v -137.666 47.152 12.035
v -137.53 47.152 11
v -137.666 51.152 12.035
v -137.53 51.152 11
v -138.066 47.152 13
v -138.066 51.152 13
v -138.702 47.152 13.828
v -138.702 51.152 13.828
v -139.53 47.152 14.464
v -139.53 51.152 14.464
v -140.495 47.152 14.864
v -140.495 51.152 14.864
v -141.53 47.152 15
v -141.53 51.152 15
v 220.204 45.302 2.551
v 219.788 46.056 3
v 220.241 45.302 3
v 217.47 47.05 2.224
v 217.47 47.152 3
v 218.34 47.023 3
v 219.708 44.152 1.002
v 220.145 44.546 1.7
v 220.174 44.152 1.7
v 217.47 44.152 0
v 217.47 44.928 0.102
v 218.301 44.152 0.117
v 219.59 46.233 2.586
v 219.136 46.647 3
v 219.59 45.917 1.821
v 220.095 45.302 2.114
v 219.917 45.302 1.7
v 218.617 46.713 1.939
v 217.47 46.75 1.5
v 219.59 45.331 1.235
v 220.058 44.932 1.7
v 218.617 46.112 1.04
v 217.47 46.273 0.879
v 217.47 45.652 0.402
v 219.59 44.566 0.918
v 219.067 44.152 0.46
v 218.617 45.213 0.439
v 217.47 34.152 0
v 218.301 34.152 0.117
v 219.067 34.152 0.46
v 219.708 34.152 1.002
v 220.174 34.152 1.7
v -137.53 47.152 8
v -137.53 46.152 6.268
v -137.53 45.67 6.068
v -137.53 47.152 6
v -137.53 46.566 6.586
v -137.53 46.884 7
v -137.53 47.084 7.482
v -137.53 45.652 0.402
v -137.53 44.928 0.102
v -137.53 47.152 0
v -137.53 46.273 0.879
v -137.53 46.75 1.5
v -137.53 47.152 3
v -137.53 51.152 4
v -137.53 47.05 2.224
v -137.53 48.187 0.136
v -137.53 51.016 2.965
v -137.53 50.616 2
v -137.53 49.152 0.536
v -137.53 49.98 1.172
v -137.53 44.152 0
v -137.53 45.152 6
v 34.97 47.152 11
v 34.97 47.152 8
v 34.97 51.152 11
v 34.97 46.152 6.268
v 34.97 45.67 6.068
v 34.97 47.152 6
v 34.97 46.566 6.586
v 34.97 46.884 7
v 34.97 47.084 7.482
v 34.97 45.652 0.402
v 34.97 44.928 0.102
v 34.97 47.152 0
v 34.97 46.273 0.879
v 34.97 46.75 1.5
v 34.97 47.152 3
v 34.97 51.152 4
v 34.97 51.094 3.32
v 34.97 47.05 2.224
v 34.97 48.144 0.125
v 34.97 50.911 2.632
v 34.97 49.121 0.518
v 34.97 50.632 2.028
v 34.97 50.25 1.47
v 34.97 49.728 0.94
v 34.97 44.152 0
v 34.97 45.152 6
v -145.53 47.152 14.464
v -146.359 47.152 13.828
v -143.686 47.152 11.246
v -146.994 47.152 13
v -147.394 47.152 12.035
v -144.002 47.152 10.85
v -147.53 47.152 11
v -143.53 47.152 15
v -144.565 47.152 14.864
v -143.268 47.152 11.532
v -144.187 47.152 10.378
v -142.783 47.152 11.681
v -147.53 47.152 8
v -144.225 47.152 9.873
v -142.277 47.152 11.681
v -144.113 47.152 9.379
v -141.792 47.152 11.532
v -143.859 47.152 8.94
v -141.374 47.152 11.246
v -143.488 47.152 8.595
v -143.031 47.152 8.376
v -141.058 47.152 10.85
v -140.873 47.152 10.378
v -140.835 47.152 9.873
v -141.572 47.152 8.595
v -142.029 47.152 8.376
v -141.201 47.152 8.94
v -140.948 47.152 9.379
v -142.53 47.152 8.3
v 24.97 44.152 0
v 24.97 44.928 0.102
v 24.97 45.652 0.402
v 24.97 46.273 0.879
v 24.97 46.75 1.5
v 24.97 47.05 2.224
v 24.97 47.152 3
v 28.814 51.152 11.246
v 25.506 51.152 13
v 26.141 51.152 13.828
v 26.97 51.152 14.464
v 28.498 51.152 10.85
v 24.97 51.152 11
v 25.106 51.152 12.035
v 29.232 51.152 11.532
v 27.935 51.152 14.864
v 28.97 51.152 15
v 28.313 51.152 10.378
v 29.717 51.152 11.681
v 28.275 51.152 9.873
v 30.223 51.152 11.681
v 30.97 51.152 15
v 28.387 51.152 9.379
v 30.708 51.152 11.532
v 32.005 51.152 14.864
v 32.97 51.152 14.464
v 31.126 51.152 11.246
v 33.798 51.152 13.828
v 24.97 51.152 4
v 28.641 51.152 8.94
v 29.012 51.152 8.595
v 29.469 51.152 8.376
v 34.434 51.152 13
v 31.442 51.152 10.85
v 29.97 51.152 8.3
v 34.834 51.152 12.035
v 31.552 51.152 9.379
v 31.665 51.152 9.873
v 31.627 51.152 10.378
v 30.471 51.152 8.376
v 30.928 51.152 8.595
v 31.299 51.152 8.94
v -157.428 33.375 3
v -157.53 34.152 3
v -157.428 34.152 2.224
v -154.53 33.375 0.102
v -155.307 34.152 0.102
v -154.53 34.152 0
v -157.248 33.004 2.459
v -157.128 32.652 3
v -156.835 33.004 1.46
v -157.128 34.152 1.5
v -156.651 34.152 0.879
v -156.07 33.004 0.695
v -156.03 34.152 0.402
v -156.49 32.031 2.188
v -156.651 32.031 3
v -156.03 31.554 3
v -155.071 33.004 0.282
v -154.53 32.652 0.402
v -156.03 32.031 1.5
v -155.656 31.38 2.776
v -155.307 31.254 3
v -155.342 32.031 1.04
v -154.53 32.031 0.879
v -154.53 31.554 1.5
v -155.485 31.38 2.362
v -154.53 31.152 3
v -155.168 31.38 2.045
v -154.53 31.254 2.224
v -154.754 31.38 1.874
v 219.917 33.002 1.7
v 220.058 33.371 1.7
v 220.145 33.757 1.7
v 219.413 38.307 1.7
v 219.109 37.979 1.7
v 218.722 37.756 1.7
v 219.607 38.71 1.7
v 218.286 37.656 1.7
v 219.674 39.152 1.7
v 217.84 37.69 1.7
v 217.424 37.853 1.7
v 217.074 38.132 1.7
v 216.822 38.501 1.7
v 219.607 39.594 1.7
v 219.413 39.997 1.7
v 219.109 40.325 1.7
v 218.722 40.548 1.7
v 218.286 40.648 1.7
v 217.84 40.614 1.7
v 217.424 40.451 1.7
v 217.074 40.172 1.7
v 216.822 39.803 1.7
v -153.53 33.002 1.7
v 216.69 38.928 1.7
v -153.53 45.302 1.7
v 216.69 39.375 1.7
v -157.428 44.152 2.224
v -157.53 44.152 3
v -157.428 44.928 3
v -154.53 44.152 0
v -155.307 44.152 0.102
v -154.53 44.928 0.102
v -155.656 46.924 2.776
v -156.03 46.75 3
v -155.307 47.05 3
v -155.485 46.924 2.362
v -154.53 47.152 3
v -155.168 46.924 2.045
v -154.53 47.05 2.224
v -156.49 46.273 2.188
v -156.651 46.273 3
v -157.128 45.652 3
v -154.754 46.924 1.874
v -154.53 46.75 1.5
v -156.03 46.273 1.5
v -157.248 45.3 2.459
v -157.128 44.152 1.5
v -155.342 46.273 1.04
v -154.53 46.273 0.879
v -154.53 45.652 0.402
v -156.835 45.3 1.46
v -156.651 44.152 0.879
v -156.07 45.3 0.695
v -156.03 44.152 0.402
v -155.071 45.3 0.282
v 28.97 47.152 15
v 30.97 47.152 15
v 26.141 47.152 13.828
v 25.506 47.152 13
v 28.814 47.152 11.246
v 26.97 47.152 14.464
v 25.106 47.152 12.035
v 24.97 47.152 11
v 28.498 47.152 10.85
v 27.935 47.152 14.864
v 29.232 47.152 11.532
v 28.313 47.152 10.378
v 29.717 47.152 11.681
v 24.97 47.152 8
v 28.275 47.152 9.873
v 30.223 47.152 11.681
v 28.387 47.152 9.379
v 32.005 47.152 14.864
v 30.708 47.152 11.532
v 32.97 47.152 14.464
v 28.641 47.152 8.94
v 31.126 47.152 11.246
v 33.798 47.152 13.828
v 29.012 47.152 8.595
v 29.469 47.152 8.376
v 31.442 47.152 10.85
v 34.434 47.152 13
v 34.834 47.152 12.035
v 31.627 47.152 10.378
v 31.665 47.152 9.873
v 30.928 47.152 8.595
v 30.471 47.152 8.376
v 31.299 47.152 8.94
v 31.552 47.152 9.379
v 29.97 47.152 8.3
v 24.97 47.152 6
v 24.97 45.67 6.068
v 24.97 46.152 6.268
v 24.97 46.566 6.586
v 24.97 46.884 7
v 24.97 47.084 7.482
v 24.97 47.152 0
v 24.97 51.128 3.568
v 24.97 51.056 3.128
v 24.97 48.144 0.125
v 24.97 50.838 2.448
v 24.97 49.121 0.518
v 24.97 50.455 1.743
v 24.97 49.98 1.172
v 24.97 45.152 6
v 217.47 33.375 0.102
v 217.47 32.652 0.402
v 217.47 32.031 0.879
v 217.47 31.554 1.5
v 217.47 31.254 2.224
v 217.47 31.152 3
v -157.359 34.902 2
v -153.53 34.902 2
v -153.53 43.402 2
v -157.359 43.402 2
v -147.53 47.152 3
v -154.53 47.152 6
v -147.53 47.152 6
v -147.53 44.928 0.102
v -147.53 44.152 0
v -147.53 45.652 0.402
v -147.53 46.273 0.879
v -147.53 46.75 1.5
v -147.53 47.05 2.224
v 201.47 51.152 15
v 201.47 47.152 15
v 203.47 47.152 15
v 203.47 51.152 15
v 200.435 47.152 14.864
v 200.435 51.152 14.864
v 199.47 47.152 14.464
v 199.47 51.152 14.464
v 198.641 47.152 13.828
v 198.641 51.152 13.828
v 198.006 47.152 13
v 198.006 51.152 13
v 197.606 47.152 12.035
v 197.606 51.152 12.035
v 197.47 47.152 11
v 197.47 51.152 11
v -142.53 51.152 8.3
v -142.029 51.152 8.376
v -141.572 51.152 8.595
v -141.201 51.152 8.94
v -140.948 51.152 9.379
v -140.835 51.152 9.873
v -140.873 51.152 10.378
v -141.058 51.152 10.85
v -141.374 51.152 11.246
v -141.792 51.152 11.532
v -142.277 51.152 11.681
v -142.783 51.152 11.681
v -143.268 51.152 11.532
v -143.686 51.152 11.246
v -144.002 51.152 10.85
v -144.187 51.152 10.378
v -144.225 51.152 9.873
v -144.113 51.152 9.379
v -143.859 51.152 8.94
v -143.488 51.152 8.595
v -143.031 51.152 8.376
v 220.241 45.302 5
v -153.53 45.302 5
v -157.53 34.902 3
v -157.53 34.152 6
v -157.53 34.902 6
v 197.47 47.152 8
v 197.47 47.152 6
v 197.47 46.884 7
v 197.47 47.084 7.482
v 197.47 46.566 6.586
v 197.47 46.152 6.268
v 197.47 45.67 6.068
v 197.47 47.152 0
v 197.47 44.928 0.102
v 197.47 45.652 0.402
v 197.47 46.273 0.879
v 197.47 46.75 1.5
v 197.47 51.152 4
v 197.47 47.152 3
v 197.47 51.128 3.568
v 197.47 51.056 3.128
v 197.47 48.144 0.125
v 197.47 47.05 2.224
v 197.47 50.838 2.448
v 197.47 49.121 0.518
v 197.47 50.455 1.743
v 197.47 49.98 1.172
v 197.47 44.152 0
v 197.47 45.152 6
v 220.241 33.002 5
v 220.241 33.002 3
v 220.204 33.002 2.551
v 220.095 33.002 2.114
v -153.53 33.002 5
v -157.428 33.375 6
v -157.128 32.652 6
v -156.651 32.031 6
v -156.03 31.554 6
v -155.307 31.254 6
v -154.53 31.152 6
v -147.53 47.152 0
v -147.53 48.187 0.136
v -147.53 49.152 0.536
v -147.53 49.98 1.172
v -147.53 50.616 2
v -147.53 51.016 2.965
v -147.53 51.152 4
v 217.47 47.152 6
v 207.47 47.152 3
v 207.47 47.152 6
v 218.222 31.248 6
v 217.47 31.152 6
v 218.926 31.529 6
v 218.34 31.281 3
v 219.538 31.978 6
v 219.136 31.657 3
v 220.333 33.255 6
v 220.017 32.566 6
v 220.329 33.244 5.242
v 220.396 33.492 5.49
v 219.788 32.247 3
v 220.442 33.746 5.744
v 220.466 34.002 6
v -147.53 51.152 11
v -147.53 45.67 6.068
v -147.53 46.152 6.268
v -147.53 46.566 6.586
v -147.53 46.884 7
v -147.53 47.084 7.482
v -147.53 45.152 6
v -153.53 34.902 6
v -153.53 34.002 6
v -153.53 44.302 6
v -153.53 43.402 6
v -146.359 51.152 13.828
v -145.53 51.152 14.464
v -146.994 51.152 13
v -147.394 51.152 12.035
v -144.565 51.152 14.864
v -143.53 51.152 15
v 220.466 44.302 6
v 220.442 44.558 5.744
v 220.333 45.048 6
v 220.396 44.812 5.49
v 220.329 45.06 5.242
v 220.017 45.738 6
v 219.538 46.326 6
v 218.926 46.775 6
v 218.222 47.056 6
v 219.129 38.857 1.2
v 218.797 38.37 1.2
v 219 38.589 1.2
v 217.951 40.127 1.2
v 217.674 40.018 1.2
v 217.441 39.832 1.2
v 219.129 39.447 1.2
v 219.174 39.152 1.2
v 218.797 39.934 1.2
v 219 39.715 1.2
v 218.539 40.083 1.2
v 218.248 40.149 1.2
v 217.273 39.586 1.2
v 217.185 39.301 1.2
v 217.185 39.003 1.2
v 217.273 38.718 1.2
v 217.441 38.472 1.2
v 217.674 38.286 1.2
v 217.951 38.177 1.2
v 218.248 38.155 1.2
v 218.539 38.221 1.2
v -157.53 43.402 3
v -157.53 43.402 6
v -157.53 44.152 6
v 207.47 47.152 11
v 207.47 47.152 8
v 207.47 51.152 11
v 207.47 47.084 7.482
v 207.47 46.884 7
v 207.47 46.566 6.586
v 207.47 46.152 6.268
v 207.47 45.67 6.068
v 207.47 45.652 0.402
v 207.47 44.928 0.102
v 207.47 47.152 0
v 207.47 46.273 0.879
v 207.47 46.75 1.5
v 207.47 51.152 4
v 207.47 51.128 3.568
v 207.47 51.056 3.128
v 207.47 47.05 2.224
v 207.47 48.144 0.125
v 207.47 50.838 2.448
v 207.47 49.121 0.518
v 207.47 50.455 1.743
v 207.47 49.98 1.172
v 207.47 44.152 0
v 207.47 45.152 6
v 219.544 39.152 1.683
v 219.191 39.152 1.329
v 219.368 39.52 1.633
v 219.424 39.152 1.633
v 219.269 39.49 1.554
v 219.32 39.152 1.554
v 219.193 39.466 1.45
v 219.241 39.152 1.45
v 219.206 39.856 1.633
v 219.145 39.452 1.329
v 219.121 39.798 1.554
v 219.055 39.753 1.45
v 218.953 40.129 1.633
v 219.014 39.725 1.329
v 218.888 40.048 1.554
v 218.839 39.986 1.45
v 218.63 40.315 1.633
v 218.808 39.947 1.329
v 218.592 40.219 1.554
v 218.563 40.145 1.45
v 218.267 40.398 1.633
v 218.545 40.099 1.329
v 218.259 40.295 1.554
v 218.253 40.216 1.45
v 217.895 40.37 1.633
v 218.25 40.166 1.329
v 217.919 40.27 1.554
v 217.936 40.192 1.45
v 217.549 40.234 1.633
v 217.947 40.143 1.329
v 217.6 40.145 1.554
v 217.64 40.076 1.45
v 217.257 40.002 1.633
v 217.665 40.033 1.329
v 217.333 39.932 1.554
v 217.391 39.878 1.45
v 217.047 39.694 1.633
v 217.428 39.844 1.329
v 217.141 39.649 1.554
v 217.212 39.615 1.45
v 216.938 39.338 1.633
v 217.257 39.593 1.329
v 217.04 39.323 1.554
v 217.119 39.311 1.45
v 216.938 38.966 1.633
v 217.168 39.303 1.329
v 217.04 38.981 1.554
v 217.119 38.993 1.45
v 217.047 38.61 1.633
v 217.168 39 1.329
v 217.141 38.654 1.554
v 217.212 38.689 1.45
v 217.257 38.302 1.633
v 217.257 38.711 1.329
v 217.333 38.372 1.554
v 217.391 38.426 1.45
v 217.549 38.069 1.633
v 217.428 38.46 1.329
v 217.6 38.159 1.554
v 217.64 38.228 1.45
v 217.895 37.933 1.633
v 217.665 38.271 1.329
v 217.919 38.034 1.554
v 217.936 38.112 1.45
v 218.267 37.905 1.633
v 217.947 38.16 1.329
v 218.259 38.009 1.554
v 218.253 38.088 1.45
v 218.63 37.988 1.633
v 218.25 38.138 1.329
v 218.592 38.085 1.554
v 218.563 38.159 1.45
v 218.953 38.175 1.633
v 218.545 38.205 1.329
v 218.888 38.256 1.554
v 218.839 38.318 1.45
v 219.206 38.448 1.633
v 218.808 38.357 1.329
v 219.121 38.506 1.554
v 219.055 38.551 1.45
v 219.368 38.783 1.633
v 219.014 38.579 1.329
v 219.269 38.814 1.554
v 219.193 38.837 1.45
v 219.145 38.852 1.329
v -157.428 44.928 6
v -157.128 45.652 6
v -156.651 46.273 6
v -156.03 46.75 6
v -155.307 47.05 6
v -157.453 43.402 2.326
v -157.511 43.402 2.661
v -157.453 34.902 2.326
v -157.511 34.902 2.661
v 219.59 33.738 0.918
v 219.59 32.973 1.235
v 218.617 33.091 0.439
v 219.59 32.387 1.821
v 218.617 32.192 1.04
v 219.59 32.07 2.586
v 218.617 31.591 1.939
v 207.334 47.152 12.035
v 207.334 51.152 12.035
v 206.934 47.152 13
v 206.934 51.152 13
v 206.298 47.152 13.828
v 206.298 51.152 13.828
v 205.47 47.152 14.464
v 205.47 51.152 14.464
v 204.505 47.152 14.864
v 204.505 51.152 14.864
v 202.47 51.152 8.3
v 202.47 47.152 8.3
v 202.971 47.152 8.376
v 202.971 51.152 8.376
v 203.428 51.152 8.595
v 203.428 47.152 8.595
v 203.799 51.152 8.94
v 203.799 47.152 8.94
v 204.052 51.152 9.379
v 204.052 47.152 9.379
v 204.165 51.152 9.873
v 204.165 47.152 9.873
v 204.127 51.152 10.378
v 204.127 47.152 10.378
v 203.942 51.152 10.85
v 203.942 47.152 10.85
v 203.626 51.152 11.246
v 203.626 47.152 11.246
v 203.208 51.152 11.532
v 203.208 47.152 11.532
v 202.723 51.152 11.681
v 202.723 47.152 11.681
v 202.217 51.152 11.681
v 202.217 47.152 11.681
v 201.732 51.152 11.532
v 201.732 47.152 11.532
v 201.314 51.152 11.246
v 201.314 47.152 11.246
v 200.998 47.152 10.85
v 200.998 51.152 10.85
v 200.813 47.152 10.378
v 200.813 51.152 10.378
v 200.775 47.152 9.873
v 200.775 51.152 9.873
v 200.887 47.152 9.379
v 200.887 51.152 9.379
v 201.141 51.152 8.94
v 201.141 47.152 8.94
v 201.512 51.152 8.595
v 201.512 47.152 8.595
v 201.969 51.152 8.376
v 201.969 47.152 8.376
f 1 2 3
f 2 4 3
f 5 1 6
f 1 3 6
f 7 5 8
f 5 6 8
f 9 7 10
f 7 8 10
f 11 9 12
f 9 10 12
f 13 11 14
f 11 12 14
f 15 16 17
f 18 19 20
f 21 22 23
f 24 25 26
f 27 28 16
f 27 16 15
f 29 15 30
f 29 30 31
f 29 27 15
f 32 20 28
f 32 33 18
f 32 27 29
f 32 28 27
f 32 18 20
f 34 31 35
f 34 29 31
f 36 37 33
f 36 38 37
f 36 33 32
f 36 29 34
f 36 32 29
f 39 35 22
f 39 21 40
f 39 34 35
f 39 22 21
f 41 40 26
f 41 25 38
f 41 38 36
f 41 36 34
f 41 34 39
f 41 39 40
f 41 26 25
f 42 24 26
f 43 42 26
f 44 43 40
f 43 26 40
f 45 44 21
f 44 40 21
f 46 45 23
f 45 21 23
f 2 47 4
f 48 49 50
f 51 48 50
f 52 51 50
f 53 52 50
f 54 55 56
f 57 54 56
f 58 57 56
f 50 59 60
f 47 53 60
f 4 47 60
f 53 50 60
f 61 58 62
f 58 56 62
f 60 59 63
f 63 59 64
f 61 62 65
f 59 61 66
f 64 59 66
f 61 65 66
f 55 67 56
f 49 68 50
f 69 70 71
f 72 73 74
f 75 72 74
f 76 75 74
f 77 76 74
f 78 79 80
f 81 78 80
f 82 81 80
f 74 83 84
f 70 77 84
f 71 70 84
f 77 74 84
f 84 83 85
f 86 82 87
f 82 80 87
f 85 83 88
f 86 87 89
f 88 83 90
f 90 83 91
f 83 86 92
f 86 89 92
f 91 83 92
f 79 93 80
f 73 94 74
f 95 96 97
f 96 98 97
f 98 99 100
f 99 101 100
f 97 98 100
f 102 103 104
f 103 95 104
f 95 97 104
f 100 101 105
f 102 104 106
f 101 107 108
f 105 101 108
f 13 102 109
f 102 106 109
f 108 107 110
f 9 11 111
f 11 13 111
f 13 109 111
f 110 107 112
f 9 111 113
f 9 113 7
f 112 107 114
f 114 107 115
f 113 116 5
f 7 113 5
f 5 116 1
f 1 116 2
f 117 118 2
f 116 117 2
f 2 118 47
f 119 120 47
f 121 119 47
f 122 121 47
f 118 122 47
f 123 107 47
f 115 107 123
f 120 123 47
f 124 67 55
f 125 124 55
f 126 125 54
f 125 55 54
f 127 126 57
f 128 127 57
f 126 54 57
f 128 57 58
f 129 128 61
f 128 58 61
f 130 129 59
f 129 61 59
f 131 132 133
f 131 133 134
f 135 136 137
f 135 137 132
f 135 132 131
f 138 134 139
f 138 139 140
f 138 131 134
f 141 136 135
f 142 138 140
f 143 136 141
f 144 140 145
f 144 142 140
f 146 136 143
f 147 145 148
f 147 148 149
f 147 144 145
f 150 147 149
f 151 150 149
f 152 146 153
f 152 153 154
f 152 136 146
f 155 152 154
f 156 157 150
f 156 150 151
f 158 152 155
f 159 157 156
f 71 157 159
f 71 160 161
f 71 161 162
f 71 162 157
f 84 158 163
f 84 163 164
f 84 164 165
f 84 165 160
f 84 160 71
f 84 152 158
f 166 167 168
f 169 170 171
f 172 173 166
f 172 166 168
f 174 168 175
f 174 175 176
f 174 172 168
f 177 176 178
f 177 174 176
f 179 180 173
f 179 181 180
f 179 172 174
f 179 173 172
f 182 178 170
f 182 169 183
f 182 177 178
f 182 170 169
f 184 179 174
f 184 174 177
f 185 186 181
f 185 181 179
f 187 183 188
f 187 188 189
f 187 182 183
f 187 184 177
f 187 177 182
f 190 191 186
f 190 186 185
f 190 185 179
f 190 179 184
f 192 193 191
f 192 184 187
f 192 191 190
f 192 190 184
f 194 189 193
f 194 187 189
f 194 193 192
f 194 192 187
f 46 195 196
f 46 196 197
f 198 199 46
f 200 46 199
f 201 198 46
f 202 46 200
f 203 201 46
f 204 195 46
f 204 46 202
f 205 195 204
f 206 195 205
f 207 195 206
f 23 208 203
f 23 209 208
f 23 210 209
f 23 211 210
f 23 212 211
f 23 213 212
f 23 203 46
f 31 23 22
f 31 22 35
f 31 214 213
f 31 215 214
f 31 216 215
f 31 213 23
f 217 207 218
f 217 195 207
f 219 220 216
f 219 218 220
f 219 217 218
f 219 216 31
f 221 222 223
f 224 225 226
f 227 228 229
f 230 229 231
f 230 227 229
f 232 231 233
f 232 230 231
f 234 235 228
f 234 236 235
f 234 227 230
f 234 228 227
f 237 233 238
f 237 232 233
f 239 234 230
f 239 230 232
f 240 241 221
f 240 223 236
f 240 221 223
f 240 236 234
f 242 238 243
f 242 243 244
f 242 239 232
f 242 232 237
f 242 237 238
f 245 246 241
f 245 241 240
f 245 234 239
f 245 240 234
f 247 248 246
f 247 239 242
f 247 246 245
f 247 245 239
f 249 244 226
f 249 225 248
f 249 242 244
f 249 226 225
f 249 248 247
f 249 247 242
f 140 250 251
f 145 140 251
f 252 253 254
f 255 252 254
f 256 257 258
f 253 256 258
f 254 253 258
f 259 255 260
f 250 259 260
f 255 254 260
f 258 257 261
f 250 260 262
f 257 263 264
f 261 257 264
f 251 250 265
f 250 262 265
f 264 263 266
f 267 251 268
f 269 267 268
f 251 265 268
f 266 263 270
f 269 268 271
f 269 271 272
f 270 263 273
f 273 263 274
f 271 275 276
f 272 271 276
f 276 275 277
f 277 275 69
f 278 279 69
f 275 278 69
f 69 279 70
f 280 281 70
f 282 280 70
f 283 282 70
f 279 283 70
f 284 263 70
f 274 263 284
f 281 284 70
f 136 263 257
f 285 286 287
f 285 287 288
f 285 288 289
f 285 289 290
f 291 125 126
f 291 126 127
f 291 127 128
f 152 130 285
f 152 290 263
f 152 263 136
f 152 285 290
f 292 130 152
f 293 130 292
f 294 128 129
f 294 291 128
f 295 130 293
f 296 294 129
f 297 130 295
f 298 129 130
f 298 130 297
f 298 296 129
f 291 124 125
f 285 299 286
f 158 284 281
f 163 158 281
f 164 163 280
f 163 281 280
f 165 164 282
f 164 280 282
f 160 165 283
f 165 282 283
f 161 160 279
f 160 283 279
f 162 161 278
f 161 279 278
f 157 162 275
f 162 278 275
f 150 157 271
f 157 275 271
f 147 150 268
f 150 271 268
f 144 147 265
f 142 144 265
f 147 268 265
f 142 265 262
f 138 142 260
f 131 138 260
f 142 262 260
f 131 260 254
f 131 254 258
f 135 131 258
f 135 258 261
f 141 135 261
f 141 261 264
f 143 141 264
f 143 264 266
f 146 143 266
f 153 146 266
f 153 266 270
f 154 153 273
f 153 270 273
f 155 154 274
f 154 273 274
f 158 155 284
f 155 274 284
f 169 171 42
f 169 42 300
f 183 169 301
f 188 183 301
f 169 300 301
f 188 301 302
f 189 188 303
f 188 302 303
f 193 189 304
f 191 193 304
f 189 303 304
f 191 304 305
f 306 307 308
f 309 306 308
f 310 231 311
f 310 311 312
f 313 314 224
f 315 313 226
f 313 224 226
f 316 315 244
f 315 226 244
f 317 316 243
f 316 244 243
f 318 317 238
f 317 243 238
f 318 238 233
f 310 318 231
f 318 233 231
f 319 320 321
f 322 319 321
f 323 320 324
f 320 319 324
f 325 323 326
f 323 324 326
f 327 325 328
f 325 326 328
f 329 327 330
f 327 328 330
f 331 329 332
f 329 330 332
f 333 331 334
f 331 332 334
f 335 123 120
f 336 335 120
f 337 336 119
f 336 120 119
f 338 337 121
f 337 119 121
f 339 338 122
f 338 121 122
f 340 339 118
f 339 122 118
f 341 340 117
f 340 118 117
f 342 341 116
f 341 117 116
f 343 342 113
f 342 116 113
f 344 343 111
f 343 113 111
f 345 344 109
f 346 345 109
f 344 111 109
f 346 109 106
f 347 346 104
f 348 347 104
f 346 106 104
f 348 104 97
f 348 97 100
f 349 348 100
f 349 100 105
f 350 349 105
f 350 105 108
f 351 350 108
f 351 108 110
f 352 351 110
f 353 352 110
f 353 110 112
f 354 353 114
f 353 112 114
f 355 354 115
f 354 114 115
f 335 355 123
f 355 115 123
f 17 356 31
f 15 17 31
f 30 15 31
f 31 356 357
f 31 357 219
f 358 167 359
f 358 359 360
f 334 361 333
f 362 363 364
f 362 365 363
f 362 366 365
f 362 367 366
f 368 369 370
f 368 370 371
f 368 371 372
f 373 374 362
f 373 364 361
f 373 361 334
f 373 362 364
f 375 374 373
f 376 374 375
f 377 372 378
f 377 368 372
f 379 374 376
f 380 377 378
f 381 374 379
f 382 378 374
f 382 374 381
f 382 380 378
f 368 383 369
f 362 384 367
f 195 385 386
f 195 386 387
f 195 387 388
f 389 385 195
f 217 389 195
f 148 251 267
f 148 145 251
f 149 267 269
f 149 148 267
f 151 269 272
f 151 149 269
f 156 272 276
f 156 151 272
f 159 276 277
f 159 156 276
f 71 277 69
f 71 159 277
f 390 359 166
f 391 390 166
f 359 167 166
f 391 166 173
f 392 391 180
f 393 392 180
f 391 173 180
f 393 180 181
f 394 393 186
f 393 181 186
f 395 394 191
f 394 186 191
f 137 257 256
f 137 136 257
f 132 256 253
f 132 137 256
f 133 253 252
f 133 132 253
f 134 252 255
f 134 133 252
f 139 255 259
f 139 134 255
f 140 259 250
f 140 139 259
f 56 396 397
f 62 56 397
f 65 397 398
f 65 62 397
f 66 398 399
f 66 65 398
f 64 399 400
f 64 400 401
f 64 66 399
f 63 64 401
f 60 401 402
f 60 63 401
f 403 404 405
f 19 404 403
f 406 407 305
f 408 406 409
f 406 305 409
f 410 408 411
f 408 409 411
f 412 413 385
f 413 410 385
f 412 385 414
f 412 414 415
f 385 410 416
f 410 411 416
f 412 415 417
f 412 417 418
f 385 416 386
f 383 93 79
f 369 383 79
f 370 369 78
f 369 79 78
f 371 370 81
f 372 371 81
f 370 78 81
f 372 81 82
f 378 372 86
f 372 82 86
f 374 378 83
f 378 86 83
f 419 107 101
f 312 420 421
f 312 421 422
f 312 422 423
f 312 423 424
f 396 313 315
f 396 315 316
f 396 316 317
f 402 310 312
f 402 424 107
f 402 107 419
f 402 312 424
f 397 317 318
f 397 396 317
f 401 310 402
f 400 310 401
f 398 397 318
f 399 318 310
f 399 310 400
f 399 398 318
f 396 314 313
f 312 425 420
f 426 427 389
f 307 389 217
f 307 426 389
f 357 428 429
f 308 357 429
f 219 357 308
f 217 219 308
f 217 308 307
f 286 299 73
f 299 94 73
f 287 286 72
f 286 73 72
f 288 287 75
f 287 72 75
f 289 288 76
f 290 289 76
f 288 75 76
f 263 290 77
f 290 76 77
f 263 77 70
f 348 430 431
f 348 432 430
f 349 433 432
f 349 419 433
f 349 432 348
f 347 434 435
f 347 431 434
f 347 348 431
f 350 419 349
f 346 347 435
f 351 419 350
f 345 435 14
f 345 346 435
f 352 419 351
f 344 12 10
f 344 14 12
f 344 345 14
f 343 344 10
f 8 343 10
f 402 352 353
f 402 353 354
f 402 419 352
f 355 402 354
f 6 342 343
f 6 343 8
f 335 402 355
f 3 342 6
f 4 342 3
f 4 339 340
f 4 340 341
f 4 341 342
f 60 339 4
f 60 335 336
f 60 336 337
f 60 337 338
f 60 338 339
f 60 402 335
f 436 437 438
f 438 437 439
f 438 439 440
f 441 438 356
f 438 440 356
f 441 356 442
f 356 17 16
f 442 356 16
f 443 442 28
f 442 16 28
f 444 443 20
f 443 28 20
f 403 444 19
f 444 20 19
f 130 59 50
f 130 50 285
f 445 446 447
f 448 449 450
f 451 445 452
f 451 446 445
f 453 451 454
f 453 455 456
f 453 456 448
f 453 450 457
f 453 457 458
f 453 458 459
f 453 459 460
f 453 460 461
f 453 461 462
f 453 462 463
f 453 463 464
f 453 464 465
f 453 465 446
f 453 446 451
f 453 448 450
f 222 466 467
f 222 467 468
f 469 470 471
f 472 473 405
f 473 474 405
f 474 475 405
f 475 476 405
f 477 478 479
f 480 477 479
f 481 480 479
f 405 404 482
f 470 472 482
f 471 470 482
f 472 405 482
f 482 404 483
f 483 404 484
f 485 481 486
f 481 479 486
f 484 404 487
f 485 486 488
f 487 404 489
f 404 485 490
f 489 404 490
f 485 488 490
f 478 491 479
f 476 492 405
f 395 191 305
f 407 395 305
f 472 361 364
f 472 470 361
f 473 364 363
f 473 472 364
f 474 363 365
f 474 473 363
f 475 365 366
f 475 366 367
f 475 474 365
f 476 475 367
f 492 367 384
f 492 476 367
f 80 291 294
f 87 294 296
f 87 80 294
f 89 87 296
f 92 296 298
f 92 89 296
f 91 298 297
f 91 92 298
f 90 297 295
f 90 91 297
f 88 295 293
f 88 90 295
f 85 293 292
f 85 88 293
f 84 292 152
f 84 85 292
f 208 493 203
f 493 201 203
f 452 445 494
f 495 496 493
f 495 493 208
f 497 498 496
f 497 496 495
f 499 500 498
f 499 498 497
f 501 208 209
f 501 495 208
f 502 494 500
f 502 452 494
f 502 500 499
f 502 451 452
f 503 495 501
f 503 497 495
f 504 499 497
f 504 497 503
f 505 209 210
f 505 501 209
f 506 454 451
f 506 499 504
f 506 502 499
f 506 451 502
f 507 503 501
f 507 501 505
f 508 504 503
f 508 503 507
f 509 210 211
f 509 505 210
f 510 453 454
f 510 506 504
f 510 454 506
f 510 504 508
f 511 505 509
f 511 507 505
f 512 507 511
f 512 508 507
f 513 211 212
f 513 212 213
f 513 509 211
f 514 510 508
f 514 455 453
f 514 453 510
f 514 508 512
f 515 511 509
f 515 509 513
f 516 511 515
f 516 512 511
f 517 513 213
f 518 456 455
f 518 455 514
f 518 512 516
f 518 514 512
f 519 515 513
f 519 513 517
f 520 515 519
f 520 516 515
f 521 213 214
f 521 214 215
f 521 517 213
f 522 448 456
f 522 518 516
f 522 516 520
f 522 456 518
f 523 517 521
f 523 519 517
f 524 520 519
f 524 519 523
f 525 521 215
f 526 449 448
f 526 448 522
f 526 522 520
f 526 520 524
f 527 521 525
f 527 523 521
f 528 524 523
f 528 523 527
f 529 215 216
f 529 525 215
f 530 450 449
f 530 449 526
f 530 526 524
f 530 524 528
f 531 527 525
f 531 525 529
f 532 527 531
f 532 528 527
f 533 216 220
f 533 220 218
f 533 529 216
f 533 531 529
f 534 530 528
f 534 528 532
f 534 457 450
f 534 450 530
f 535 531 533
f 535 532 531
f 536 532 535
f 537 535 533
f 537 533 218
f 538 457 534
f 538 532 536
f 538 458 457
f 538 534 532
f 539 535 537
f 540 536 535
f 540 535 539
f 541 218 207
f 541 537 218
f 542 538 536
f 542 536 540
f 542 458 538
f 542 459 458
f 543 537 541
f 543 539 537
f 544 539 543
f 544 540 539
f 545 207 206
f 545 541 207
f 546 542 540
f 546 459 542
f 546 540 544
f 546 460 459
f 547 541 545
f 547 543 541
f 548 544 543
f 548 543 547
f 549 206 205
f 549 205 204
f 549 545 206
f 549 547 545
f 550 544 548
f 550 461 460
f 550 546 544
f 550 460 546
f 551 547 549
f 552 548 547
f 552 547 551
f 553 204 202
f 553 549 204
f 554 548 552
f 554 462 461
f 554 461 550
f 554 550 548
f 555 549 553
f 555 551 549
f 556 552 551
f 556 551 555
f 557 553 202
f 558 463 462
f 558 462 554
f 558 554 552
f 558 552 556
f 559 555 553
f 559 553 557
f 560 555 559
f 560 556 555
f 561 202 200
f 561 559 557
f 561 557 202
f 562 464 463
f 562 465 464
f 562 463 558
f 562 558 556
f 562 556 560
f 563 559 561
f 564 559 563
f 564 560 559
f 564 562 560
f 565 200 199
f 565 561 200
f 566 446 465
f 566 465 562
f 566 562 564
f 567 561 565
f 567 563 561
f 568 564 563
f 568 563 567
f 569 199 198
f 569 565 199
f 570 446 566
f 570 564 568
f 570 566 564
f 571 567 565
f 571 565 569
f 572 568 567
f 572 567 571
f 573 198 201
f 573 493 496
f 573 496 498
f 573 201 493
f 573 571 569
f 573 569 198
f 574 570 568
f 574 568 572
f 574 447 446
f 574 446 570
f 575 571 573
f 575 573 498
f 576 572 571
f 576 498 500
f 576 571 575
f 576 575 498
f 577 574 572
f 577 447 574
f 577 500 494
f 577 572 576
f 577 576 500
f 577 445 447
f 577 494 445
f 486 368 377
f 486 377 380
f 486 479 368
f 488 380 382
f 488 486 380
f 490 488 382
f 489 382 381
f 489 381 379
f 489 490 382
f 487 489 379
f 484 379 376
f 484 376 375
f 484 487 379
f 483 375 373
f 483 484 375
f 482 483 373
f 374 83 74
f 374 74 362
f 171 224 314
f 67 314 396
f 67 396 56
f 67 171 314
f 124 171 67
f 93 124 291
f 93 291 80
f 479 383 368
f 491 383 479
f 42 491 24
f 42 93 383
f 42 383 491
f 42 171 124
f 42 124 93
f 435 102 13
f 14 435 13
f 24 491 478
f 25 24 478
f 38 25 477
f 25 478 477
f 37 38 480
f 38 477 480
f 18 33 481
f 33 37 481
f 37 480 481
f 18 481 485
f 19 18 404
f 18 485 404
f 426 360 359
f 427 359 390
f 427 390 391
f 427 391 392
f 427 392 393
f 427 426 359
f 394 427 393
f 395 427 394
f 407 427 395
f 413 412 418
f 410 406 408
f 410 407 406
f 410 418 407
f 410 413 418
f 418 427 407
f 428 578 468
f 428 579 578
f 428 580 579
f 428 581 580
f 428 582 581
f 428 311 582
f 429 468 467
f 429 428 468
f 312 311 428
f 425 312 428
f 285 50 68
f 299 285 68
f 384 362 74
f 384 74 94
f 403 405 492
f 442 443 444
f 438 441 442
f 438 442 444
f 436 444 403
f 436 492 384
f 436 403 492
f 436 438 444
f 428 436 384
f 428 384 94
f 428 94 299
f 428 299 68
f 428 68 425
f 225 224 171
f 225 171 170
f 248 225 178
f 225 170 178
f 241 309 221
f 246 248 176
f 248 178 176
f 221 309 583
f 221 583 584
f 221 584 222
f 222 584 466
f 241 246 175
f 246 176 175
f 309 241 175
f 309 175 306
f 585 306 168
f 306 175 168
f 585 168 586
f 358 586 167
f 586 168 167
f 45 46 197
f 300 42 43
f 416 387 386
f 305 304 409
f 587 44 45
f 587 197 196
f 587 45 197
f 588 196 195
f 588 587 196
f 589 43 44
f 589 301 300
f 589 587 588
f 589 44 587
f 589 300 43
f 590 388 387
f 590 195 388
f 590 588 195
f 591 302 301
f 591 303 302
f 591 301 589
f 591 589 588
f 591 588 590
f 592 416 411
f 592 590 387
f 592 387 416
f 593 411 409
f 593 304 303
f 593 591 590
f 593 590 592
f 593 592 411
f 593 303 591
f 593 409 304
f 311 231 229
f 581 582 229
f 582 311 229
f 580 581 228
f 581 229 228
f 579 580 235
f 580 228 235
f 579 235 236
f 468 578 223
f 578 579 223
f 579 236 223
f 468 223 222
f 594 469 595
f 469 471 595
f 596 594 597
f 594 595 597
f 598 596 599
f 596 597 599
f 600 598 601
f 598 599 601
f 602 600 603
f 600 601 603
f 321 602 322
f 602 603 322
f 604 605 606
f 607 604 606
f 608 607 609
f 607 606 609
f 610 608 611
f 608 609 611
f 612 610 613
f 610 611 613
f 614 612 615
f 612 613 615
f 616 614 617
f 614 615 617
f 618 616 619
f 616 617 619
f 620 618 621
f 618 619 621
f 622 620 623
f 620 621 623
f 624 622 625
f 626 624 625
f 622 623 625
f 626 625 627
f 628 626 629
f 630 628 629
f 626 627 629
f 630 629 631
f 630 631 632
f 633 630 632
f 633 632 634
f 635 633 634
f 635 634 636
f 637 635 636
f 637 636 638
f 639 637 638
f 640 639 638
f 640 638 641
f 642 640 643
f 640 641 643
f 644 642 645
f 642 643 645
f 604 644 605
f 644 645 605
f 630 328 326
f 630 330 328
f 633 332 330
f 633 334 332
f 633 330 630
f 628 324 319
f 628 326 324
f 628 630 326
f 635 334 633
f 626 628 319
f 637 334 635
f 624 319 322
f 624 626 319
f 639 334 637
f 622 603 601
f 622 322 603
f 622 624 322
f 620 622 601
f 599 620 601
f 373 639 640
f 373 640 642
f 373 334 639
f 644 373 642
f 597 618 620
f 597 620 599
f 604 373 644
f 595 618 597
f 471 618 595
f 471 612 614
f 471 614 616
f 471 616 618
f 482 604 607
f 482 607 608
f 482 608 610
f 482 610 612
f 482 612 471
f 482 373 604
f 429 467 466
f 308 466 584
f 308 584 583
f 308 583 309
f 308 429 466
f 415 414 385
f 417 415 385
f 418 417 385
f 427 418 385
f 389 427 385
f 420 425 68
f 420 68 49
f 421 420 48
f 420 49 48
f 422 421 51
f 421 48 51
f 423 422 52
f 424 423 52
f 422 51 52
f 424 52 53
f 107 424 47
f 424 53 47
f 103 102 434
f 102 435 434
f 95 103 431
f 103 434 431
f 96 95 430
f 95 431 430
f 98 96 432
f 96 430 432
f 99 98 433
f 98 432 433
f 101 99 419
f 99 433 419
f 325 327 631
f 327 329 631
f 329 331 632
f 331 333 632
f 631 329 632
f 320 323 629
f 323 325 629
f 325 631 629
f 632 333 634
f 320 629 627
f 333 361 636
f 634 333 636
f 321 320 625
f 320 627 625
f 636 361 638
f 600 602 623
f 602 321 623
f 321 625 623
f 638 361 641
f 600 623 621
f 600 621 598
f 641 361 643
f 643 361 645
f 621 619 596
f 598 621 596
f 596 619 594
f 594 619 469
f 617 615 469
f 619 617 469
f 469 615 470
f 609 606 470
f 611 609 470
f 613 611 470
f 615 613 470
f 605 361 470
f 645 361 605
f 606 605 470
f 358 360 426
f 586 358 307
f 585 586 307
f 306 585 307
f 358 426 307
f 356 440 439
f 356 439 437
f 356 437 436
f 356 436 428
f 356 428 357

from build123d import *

# Parameters (mm, degrees)
SKETCH1_W               = 378
SKETCH1_H               = 16
BOSS_EXTRUDE1_DEPTH     = 6
CUT_EXTRUDE1_DEPTH      = 381.976768496
CUT_EXTRUDE1_DEPTH_BACK = 374
SKETCH3_W               = 4.3
SKETCH3_H               = 12.3
BOSS_EXTRUDE2_DEPTH     = 374
BOSS_EXTRUDE3_DEPTH     = 374
SKETCH6_W               = 4
SKETCH6_H               = 8.5
CUT_EXTRUDE2_DEPTH      = 378.00835287
FILLET2_R               = 3
SKETCH13_W              = 10
SKETCH13_H              = 15
BOSS_EXTRUDE5_DEPTH     = 4
FILLET9_R               = 3
FILLET10_R              = 4
SKETCH14_R              = 1.7
CUT_EXTRUDE5_DEPTH      = 4
FILLET11_R              = 4
FILLET12_R              = 4
LPATTERN3_COUNT         = 3
LPATTERN3_PITCH         = 172.5
LPATTERN4_COUNT         = 3
LPATTERN4_PITCH         = 172.5
FILLET13_R              = 4
FILLET14_R              = 4
FILLET15_R              = 3
FILLET16_R              = 4
FILLET17_R              = 4
FILLET18_R              = 4
FILLET19_R              = 4
FILLET20_R              = 2
FILLET21_R              = 2
FILLET22_R              = 2
FILLET23_R              = 3
SKETCH15_R              = 1
CUT_EXTRUDE6_DEPTH      = 0.5
FILLET24_R              = 0.5


# Some blends are built 0.0001 mm under size
with BuildPart() as part:
    # Sketch1 → Boss-Extrude1 (new body)
    with BuildSketch(Plane.XY):
        with Locations((31.46991404, 39.151862464)):
            Rectangle(SKETCH1_W, SKETCH1_H)
    extrude(amount=BOSS_EXTRUDE1_DEPTH)

    # Sketch3 → Cut-Extrude1 (cut, two sides: drawn at the far end of the back side and taken through both)
    with BuildSketch(Plane(origin=(220.46991404, 0, 0), x_dir=(0, 0, -1), z_dir=(1, 0, 0)).offset(-CUT_EXTRUDE1_DEPTH_BACK)):
        with Locations((-3.85, 39.151862464)):
            Rectangle(SKETCH3_W, SKETCH3_H)
    extrude(amount=CUT_EXTRUDE1_DEPTH + CUT_EXTRUDE1_DEPTH_BACK, mode=Mode.SUBTRACT)

    # Sketch4 → Boss-Extrude2 (add)
    with BuildSketch(Plane(origin=(220.46991404, 0, 0), x_dir=(0, 0, -1), z_dir=(1, 0, 0))):
        Polygon((-6, 33.001862464), (-6, 34.001862464), (-5, 33.001862464), align=None)
    extrude(amount=-BOSS_EXTRUDE2_DEPTH)

    # Sketch5 → Boss-Extrude3 (add)
    with BuildSketch(Plane(origin=(220.46991404, 0, 0), x_dir=(0, 0, -1), z_dir=(1, 0, 0))):
        Polygon((-6, 45.301862464), (-6, 44.301862464), (-5, 45.301862464), align=None)
    extrude(amount=-BOSS_EXTRUDE3_DEPTH)

    # Sketch6 → Cut-Extrude2 (cut, through all)
    with BuildSketch(Plane(origin=(-153.53008596, 0, 0), x_dir=(0, 0, -1), z_dir=(1, 0, 0))):
        with Locations((-4, 39.151862464)):
            Rectangle(SKETCH6_W, SKETCH6_H)
    extrude(amount=-CUT_EXTRUDE2_DEPTH, mode=Mode.SUBTRACT)

    # Fillet2
    # the kernel refuses this fillet: 3 mm, written as the material it takes off along each edge
    with BuildSketch(Plane(origin=(-157.53008596, 23.651862464, 0), x_dir=(0, 0, 1), z_dir=(0, 1, 0))) as fillet2_piece_1:
        with BuildLine():
            CenterArc((FILLET2_R, FILLET2_R), FILLET2_R, 180, 90)
            Line((0, FILLET2_R), (0, 0))
            Line((0, 0), (FILLET2_R, 0))
        make_face()
    extrude(amount=31, mode=Mode.SUBTRACT)

    # Sketch13 → Boss-Extrude5 (add)
    with BuildSketch(Plane(origin=(0, 47.151862464, 0), x_dir=(1, 0, 0), z_dir=(0, 1, 0))):
        with Locations((-142.53008596, -7.5)):
            Rectangle(SKETCH13_W, SKETCH13_H)
    boss_extrude5 = extrude(amount=BOSS_EXTRUDE5_DEPTH)

    # Fillet9
    fillet9_edges = [part.edges().sort_by_distance(p)[0] for p in [
        (32.96991404, 31.151862464, 0),
        (-156.651406303, 31.151862464, 0.878679656),
        (-157.53008596, 31.151862464, 4.5),
    ]]
    fillet(fillet9_edges, radius=FILLET9_R)

    # Fillet10
    fillet10_edges = [part.edges().sort_by_distance(p)[0] for p in [
        (-142.53008596, 51.151862464, 0),
    ]]
    fillet(fillet10_edges, radius=FILLET10_R)

    # Sketch14 → Cut-Extrude5 (cut)
    with BuildSketch(Plane.XZ.offset(-47.151862464)):
        with Locations(Location((-142.53008596, 10, 0), (0, 0, 270))):
            Circle(SKETCH14_R)
    cut_extrude5 = extrude(amount=-CUT_EXTRUDE5_DEPTH, mode=Mode.SUBTRACT)

    # Fillet11
    fillet11_edges = [part.edges().sort_by_distance(p)[0] for p in [
        (-137.53008596, 49.151862464, 15),
    ]]
    fillet(fillet11_edges, radius=FILLET11_R)

    # Fillet12
    fillet12_edges = [part.edges().sort_by_distance(p)[0] for p in [
        (-147.53008596, 49.151862464, 15),
    ]]
    fillet(fillet12_edges, radius=FILLET12_R)

    # LPattern3: Boss-Extrude5 ×3
    with Locations(*[(i * LPATTERN3_PITCH, 0, 0) for i in range(1, LPATTERN3_COUNT)]):
        add(boss_extrude5)

    # LPattern4: Cut-Extrude5 ×3
    with Locations(*[(i * LPATTERN4_PITCH, 0, 0) for i in range(1, LPATTERN4_COUNT)]):
        add(cut_extrude5, mode=Mode.SUBTRACT)

    # Fillet13
    fillet13_edges = [part.edges().sort_by_distance(p)[0] for p in [
        (29.96991404, 51.151862464, 0),
    ]]
    fillet(fillet13_edges, radius=FILLET13_R)

    # Fillet14
    fillet14_edges = [part.edges().sort_by_distance(p)[0] for p in [
        (202.46991404, 51.151862464, 0),
    ]]
    fillet(fillet14_edges, radius=FILLET14_R)

    # Fillet15
    # the kernel refuses this fillet: 3 mm, written as the material it takes off along each edge
    with BuildSketch(Plane(origin=(34.96991404, 47.151862464, 0), x_dir=(0, -1, 0), z_dir=(1, 0, 0)), Plane(origin=(-137.53008596, 47.151862464, 0), x_dir=(0, -1, 0), z_dir=(1, 0, 0))) as fillet15_piece_1:
        with BuildLine():
            CenterArc((FILLET15_R, -FILLET15_R), FILLET15_R, 90, 90)
            Line((0, -FILLET15_R), (0, 0))
            Line((0, 0), (FILLET15_R, 0))
        make_face()
    extrude(amount=162.5, mode=Mode.SUBTRACT)
    with BuildSketch(Plane(origin=(207.46991404, 47.151862464, 0), x_dir=(0, -1, 0), z_dir=(1, 0, 0))) as fillet15_piece_2:
        with BuildLine():
            CenterArc((FILLET15_R, -FILLET15_R), FILLET15_R, 90, 90)
            Line((0, -FILLET15_R), (0, 0))
            Line((0, 0), (FILLET15_R, 0))
        make_face()
    extrude(amount=20.5, mode=Mode.SUBTRACT)
    with BuildSketch(Plane(origin=(-157.53008596, 47.151862464, 3), x_dir=(1, 0, 0), z_dir=(0, 0, 1))) as fillet15_piece_3:
        with BuildLine():
            CenterArc((FILLET15_R, -FILLET15_R), FILLET15_R, 90, 90)
            Line((0, -FILLET15_R), (0, 0))
            Line((0, 0), (FILLET15_R, 0))
        make_face()
    extrude(amount=10.5, mode=Mode.SUBTRACT)
    with BuildSketch(Plane(origin=(-154.53008596, 47.151862464, 3), x_dir=(-1, 0, 0), z_dir=(0, 0, 1))) as fillet15_piece_4:
        with BuildLine():
            CenterArc((3 - FILLET15_R, FILLET15_R), FILLET15_R, 270, 90)
            Line((3 - FILLET15_R, 0), (3, 0))
            Line((3, 0), (3, FILLET15_R))
        make_face()
    revolve(axis=Axis((-154.53008596, 47.151862464, 3), (0, -1, 0)), revolution_arc=90, mode=Mode.SUBTRACT)
    with BuildSketch(Plane(origin=(-154.53008596, 47.151862464, 0), x_dir=(0, -1, 0), z_dir=(1, 0, 0))) as fillet15_piece_5:
        with BuildLine():
            CenterArc((FILLET15_R, -FILLET15_R), FILLET15_R, 90, 90)
            Line((0, -FILLET15_R), (0, 0))
            Line((0, 0), (FILLET15_R, 0))
        make_face()
    extrude(amount=7, mode=Mode.SUBTRACT)

    # Fillet16
    fillet16_edges = [part.edges().sort_by_distance(p)[0] for p in [
        (24.96991404, 49.151862464, 15),
    ]]
    fillet(fillet16_edges, radius=FILLET16_R)

    # Fillet17
    fillet17_edges = [part.edges().sort_by_distance(p)[0] for p in [
        (34.96991404, 49.151862464, 15),
    ]]
    fillet(fillet17_edges, radius=FILLET17_R)

    # Fillet18
    fillet18_edges = [part.edges().sort_by_distance(p)[0] for p in [
        (207.46991404, 49.151862464, 15),
    ]]
    fillet(fillet18_edges, radius=FILLET18_R)

    # Fillet19
    fillet19_edges = [part.edges().sort_by_distance(p)[0] for p in [
        (197.46991404, 49.151862464, 15),
    ]]
    fillet(fillet19_edges, radius=FILLET19_R)

    # Fillet20
    fillet20_edges = [part.edges().sort_by_distance(p)[0] for p in [
        (202.46991404, 47.151862464, 6),
    ]]
    fillet(fillet20_edges, radius=FILLET20_R)

    # Fillet21
    fillet21_edges = [part.edges().sort_by_distance(p)[0] for p in [
        (29.96991404, 47.151862464, 6),
    ]]
    fillet(fillet21_edges, radius=FILLET21_R)

    # Fillet22
    fillet22_edges = [part.edges().sort_by_distance(p)[0] for p in [
        (-142.53008596, 47.151862464, 6),
    ]]
    fillet(fillet22_edges, radius=FILLET22_R)

    # Fillet23
    # the kernel refuses this fillet: 3 mm, written as the material it takes off along each edge
    with BuildSketch(Plane(origin=(220.46991404, 31.151862464, 3), x_dir=(0, 1, 0), z_dir=(0, 0, 1))) as fillet23_piece_1:
        with BuildLine():
            CenterArc((FILLET23_R, FILLET23_R), FILLET23_R, 180, 90)
            Line((0, FILLET23_R), (0, 0))
            Line((0, 0), (FILLET23_R, 0))
        make_face()
    extrude(amount=10.5, mode=Mode.SUBTRACT)
    with BuildSketch(Plane(origin=(220.46991404, 34.151862464, 3), x_dir=(0, 0, -1), z_dir=(0, 1, 0))) as fillet23_piece_2:
        with BuildLine():
            CenterArc((3 - FILLET23_R, FILLET23_R), FILLET23_R, 270, 90)
            Line((3, FILLET23_R), (3, 0))
            Line((3, 0), (3 - FILLET23_R, 0))
        make_face()
    revolve(axis=Axis((220.46991404, 34.151862464, 3), (-1, 0, 0)), revolution_arc=90, mode=Mode.SUBTRACT)
    with BuildSketch(Plane(origin=(220.46991404, 47.151862464, 3), x_dir=(0, -1, 0), z_dir=(0, 0, 1))) as fillet23_piece_3:
        with BuildLine():
            CenterArc((FILLET23_R, -FILLET23_R), FILLET23_R, 90, 90)
            Line((0, -FILLET23_R), (0, 0))
            Line((0, 0), (FILLET23_R, 0))
        make_face()
    extrude(amount=10.5, mode=Mode.SUBTRACT)
    with BuildSketch(Plane(origin=(220.46991404, 44.151862464, 3), x_dir=(0, 1, 0), z_dir=(0, 0, 1))) as fillet23_piece_4:
        with BuildLine():
            CenterArc((3 - FILLET23_R, FILLET23_R), FILLET23_R, 270, 90)
            Line((3, FILLET23_R), (3, 0))
            Line((3, 0), (3 - FILLET23_R, 0))
        make_face()
    revolve(axis=Axis((220.46991404, 44.151862464, 3), (-1, 0, 0)), revolution_arc=90, mode=Mode.SUBTRACT)
    with BuildSketch(Plane(origin=(220.46991404, 44.151862464, 0), x_dir=(0, 0, 1), z_dir=(0, -1, 0))) as fillet23_piece_5:
        with BuildLine():
            CenterArc((FILLET23_R, FILLET23_R), FILLET23_R, 180, 90)
            Line((0, FILLET23_R), (0, 0))
            Line((0, 0), (FILLET23_R, 0))
        make_face()
    extrude(amount=10, mode=Mode.SUBTRACT)

    # Sketch15 → Cut-Extrude6 (cut)
    with BuildSketch(Plane.XY.offset(1.7)):
        with Locations((218.173615207, 39.151862464)):
            Circle(SKETCH15_R)
    extrude(amount=-CUT_EXTRUDE6_DEPTH, mode=Mode.SUBTRACT)

    # Fillet24
    fillet24_edges = [part.edges().sort_by_distance(p)[0] for p in [
        (217.173615207, 39.151862464, 1.7),
    ]]
    fillet(fillet24_edges, radius=FILLET24_R - 0.0001)  # a hair under: the kernel refuses the full size


solid = part.part
